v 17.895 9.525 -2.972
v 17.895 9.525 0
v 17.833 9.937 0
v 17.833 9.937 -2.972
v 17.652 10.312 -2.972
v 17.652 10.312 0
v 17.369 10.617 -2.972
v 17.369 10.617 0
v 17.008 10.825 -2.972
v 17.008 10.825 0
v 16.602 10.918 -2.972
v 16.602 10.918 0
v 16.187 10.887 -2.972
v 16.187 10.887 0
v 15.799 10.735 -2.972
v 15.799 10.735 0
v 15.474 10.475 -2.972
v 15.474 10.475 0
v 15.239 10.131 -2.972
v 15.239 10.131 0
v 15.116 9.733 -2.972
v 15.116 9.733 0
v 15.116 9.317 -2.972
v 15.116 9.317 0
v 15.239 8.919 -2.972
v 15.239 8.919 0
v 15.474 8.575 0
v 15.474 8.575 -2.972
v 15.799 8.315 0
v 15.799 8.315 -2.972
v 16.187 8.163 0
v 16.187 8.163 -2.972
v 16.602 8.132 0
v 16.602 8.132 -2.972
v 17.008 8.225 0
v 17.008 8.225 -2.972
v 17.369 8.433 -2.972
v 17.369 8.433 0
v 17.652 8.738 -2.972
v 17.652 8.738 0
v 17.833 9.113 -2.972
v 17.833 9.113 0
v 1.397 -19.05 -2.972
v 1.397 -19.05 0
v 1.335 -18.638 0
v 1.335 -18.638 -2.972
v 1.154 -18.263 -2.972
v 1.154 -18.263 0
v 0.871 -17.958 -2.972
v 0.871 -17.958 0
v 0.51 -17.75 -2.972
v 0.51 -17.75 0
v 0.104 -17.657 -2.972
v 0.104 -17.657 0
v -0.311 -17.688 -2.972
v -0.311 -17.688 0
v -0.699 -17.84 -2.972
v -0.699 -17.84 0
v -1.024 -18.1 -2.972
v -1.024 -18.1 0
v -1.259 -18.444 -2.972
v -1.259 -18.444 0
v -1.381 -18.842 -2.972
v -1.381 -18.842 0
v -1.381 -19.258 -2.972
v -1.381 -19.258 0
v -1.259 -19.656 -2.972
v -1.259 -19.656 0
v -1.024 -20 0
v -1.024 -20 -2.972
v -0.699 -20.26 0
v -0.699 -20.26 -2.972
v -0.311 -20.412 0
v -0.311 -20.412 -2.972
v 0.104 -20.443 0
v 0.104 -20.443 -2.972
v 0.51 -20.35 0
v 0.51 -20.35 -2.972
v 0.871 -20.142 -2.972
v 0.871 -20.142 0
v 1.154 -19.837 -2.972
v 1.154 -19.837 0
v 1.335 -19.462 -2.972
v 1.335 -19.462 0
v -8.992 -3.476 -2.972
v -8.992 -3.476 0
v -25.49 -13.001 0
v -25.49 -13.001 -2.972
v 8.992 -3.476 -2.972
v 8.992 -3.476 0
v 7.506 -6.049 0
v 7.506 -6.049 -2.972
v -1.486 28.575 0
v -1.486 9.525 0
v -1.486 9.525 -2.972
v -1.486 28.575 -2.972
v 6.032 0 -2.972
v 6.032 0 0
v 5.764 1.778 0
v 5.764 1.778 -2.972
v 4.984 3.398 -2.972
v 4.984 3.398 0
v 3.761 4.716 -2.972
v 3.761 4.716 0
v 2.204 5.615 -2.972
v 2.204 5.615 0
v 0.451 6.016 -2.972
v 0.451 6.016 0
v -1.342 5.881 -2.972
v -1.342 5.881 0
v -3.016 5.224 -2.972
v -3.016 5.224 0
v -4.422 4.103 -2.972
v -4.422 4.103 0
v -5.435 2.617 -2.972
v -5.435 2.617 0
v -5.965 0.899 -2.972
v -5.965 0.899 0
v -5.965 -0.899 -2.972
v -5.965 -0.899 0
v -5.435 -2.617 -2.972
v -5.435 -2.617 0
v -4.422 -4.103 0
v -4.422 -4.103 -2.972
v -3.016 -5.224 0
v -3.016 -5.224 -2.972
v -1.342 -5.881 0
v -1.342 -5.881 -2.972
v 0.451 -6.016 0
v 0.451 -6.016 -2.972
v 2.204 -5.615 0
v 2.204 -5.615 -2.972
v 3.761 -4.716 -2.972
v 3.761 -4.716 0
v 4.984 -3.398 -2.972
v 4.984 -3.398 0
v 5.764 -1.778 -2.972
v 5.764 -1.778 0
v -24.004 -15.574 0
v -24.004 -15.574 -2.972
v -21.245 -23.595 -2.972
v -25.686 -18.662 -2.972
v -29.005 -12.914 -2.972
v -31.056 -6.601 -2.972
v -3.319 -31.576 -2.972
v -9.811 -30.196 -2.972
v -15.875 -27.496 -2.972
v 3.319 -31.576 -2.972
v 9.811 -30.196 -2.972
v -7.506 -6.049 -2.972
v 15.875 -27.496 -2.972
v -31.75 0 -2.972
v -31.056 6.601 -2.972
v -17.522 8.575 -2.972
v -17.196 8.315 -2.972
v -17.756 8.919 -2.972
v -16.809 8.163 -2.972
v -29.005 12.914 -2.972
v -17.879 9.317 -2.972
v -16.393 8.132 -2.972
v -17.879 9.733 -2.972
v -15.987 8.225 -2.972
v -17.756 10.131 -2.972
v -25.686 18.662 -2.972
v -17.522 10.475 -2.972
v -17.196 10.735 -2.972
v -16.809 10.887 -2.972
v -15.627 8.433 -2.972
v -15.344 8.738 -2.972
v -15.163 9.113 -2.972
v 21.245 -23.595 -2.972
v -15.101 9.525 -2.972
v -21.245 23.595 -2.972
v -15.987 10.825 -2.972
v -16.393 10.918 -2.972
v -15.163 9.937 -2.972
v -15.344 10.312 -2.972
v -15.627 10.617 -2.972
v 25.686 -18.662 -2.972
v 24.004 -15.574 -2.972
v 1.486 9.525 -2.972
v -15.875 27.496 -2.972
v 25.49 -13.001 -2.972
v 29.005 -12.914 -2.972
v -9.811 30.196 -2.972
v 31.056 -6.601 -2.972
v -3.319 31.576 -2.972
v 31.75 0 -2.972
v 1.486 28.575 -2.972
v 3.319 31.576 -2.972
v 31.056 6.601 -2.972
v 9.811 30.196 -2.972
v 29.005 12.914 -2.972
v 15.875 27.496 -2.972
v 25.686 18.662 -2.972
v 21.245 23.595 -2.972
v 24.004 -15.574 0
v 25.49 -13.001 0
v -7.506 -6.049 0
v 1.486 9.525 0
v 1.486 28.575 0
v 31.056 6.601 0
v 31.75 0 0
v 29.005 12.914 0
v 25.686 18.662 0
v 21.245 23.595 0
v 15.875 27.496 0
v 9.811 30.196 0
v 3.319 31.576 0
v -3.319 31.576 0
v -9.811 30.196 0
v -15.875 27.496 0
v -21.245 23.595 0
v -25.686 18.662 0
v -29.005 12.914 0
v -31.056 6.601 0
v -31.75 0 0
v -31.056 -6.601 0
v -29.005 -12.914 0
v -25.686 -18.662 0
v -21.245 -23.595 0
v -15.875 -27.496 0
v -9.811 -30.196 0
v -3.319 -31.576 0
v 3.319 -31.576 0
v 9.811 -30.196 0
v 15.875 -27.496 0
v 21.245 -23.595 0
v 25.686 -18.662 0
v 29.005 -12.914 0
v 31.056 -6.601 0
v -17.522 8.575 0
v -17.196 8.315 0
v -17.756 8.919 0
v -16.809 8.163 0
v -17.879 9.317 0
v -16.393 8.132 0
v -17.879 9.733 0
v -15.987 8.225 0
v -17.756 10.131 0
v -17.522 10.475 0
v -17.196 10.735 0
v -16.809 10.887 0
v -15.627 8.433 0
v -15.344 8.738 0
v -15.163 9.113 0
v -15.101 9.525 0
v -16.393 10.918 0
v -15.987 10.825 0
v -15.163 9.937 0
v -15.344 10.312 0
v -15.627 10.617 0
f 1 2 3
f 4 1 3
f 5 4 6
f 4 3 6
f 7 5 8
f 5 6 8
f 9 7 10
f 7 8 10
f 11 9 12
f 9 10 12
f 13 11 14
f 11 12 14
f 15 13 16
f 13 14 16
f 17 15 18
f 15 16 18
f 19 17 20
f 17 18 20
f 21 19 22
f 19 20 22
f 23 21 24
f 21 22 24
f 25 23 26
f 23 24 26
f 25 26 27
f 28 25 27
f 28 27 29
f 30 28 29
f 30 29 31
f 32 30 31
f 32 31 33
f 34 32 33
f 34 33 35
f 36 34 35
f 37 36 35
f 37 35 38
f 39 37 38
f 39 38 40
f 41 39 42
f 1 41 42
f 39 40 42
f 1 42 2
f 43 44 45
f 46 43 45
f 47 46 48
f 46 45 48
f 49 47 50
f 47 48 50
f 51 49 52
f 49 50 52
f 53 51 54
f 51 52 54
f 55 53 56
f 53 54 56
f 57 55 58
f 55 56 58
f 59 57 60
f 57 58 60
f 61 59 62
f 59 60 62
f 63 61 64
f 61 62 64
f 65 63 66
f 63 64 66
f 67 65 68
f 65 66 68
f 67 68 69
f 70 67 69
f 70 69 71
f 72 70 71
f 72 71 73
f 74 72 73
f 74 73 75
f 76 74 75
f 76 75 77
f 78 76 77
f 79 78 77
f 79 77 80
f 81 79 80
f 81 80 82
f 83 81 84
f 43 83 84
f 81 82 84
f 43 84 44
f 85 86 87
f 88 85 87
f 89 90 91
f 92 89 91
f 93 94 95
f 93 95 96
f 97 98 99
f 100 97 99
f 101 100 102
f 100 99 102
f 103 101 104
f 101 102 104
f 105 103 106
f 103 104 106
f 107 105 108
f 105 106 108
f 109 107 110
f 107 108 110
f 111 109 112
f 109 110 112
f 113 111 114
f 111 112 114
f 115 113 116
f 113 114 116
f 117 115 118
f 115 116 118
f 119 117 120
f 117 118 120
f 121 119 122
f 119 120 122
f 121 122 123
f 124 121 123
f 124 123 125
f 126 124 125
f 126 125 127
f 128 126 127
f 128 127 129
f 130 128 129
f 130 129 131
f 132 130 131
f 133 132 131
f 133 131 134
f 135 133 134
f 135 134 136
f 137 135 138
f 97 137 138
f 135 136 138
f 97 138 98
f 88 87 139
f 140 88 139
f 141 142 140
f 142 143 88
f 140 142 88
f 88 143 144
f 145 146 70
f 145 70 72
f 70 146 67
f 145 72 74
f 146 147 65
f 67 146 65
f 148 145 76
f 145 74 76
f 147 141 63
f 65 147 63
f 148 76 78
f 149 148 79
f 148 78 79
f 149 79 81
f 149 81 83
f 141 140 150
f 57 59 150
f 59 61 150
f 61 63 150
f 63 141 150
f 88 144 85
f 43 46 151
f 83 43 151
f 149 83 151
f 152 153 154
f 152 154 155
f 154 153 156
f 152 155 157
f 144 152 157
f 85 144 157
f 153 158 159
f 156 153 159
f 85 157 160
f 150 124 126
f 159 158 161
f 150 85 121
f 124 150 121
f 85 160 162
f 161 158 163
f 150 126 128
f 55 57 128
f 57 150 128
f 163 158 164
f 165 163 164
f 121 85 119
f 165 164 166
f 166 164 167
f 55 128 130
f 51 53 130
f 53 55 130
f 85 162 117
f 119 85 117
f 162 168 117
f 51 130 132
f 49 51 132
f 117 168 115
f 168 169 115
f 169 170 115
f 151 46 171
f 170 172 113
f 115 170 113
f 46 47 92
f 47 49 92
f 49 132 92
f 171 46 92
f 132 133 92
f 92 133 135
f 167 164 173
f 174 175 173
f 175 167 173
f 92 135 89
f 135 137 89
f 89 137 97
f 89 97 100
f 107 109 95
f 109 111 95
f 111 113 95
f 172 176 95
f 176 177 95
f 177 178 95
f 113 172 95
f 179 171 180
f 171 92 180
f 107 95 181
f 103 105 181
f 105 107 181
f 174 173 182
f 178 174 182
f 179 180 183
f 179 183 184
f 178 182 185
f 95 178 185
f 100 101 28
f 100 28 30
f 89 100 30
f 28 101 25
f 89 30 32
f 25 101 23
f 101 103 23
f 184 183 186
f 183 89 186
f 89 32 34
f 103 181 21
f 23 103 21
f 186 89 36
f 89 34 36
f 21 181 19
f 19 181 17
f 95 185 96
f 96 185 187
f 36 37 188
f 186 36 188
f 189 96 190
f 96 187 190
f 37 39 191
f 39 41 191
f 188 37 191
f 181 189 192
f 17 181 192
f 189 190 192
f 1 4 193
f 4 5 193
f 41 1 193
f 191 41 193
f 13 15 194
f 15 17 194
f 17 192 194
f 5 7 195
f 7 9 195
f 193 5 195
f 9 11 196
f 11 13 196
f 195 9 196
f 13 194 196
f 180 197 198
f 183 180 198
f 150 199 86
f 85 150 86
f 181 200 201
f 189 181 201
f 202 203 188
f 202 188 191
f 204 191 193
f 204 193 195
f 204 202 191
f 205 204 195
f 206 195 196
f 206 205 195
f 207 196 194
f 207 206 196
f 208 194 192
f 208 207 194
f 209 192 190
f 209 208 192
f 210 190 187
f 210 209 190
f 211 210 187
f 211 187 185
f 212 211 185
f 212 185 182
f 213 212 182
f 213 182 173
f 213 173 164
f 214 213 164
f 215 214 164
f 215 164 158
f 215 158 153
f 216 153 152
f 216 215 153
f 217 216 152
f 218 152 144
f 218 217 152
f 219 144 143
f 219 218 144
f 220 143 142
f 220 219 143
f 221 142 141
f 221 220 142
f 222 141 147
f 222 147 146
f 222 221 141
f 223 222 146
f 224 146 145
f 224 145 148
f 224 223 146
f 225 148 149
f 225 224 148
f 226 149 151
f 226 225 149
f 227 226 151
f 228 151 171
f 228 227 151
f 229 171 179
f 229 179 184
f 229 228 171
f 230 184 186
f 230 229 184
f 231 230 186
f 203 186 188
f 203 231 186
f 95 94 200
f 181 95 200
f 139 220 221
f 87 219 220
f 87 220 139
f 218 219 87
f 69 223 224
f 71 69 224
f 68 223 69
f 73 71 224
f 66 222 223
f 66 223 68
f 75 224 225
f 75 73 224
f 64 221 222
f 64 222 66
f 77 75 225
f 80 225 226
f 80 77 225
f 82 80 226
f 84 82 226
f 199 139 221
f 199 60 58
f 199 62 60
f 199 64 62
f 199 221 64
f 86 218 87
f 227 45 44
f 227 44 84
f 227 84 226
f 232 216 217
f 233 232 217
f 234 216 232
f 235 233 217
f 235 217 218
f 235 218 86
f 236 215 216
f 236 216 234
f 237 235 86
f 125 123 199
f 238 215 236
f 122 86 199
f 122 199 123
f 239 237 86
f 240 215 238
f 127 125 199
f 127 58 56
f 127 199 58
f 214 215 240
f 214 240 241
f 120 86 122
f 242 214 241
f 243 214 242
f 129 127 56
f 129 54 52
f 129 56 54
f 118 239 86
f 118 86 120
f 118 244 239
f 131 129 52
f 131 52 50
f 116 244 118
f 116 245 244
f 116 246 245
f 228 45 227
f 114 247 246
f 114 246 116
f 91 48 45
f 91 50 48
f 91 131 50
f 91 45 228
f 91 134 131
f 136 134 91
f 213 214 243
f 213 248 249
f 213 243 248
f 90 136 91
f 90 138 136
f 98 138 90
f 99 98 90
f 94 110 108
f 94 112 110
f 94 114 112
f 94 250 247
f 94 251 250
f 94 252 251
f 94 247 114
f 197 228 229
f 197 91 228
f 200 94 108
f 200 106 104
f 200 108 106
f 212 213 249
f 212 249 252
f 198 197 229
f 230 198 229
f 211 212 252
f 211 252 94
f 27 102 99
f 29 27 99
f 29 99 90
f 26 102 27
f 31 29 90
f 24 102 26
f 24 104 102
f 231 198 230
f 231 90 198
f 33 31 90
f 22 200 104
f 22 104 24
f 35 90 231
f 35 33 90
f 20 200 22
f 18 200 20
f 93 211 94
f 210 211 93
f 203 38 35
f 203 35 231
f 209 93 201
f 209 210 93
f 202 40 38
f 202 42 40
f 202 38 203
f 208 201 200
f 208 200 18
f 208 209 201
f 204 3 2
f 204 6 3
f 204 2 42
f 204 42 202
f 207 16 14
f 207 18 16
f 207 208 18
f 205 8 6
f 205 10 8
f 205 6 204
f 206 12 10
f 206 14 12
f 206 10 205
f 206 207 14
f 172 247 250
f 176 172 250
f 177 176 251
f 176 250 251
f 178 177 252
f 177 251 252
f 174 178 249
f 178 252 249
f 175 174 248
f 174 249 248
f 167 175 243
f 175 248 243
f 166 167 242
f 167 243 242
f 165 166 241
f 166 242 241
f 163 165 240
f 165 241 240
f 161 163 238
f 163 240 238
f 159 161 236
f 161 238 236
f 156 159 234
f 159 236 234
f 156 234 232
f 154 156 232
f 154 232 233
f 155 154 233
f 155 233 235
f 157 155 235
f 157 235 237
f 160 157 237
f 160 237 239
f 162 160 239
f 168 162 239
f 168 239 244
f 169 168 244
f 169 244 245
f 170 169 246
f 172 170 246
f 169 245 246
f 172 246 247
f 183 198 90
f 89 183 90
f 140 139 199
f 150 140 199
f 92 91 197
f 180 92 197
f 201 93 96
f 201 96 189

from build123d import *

# Parameters (mm, degrees)
F0_R     = 31.75
F1_DEPTH = 2.9718
F2_R     = 6.0325
F2_W     = 2.9718
F2_H     = 19.05
F2_R_2   = 1.397
F3_DEPTH = 2.9718


with BuildPart() as f1:
    # F0 (on Top) → F1 (new body)
    with BuildSketch(Plane.XY):
        Circle(F0_R)
    extrude(amount=-F1_DEPTH)

    # F2 (on face) → F3 (cut, through all)
    with BuildSketch(Plane.XY):
        Circle(F2_R)
        with Locations((0, 19.05)):
            Rectangle(F2_W, F2_H)
        Polygon((-7.505942, -6.049327), (-8.991842, -3.475673), (-25.489626, -13.000673), (-24.003726, -15.574327), align=None)
        Polygon((8.991842, -3.475673), (7.505942, -6.049327), (24.003726, -15.574327), (25.489626, -13.000673), align=None)
        with Locations((-16.497784, 9.525)):
            Circle(F2_R_2)
        with Locations((16.497784, 9.525)):
            Circle(F2_R_2)
        with Locations((0, -19.05)):
            Circle(F2_R_2)
    extrude(amount=-F3_DEPTH, mode=Mode.SUBTRACT)


solid = f1.part
